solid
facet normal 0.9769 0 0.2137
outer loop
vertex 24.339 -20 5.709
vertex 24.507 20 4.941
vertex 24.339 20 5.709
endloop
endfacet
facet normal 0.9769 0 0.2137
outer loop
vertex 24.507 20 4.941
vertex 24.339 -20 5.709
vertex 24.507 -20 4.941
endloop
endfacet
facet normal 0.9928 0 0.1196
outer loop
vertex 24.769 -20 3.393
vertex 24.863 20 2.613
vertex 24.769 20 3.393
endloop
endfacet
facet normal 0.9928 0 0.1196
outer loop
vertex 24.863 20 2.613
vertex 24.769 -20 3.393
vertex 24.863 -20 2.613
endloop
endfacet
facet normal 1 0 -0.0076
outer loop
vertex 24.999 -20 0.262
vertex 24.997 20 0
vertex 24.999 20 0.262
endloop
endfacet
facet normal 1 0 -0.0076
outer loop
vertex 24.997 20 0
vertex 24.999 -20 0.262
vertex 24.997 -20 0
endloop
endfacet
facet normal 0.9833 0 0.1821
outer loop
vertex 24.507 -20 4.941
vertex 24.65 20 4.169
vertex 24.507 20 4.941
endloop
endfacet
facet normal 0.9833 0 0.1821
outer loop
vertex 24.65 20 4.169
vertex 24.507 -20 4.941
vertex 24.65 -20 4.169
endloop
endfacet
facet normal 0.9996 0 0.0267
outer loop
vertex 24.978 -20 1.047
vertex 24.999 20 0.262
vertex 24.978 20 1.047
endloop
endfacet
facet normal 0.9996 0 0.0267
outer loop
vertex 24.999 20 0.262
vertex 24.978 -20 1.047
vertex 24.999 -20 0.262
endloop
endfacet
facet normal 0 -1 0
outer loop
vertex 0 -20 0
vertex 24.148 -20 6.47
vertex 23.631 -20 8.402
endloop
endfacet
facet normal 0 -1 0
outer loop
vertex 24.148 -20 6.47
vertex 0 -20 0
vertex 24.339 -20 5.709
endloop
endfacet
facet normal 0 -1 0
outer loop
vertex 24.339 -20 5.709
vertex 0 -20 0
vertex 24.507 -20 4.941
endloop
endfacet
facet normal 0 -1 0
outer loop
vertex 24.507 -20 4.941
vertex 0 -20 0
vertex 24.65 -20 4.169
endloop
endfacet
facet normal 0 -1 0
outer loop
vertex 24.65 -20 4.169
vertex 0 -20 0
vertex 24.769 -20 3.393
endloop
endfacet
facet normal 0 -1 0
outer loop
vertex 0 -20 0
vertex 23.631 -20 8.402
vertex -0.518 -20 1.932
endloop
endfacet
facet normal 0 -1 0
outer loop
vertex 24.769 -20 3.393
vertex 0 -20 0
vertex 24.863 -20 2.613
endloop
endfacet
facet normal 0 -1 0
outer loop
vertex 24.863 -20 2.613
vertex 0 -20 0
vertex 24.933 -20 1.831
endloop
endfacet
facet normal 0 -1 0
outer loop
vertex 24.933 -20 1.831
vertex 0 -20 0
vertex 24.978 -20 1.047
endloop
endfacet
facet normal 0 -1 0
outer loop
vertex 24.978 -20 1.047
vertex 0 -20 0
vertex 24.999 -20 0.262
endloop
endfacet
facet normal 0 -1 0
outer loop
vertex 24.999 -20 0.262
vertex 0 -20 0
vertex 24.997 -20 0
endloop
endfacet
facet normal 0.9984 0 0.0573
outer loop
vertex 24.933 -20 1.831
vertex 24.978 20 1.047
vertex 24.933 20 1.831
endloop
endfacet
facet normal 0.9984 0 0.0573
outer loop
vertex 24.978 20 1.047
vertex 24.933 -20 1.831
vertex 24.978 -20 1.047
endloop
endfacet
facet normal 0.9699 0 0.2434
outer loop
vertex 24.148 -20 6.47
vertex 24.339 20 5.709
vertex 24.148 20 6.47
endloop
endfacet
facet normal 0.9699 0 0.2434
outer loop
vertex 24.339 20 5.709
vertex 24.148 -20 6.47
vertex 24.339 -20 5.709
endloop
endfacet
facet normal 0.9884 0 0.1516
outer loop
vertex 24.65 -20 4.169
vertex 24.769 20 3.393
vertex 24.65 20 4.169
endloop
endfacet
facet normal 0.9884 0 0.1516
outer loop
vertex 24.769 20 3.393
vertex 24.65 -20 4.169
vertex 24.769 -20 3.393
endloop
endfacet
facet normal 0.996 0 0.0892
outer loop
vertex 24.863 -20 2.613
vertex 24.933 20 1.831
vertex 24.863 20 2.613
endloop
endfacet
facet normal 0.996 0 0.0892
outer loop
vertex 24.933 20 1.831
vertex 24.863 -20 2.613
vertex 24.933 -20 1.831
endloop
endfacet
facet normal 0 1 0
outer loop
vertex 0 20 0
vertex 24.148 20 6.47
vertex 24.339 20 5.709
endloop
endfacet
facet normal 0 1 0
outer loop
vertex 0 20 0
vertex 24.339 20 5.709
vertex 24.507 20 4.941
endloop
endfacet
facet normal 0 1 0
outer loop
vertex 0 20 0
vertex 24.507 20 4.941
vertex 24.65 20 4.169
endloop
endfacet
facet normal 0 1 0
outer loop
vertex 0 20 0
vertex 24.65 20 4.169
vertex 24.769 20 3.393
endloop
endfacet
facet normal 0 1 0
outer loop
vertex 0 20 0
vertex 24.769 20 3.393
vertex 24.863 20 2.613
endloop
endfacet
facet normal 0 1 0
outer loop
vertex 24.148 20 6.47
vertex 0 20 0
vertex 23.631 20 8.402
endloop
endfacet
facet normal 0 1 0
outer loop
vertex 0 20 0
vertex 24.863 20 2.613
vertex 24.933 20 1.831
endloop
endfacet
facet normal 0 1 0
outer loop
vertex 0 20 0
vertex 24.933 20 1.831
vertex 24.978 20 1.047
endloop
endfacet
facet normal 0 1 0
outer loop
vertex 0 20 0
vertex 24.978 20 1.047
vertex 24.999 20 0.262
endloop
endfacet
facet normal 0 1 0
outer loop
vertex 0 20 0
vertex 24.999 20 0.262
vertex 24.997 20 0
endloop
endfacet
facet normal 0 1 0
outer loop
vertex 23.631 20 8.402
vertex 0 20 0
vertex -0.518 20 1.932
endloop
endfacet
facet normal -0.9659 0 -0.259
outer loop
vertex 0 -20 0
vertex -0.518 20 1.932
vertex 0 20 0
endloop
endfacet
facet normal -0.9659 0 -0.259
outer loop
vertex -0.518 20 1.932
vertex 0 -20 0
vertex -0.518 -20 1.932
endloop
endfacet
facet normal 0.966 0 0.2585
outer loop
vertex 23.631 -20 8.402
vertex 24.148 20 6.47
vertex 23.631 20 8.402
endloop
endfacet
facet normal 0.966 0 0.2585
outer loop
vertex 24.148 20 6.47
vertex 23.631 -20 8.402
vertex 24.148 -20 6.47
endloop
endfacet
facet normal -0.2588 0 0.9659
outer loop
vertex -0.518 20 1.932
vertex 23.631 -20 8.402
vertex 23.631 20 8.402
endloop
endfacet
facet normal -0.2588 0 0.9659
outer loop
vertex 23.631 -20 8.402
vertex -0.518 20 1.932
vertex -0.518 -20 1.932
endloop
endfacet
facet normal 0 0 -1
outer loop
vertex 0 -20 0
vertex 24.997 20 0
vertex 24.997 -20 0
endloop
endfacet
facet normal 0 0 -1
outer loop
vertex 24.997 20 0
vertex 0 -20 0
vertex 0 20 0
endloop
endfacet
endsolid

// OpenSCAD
// Creacion de cuña paramétrica para apoyo de camara en cuad

//Variables:
ancho=25;
largo=40;
grueso=2; // En el vertice de la cuña.
angulo=15; // En grados, menor de 90º

// Creacion del la cuña en los siguientes pasos: 
// 1. Creacion de un cilindro para la base del la cuña
// 2. Al cilindro anterior le hacemos una interseccion booleana para quedarnos con el cuarto inferior.
// 3. Se le crea un cubo superior para generar el grueso de la cuña
// 4. Se gira todo el cuerpor de la cuña el angulo
// 5. Se elimina la parte por debajo del plano XY

// 5.Sustraccion del cuerpo cubo de sobrante al cuerpo base
difference(){
// 4.Rotacion del cuerpo base
rotate([0,-angulo,0])
// 3. Cuerpo de la cuña incluido el gruueso
    union(){
    // 2.Cuerpo de la cuña
    intersection(){
    // 1. Cilindro base
    rotate([90,0,0])
    cylinder(r=ancho,h=largo,$fn=200, center=true);
    // 2.Cubo para Base
    translate([0,-((largo/2)+1),-ancho-2])
    cube([ancho+2,largo+2,ancho+2]);
    }
    //3.cubo de grosor superior
    translate([0,-largo/2,0])
    cube([ancho,largo,grueso]);
}
// 5.cubo para eliminiacion del sobrante
translate([-1,-((largo/2)+1),-ancho-2])
cube([ancho+2,largo+2,ancho+2]);
}
